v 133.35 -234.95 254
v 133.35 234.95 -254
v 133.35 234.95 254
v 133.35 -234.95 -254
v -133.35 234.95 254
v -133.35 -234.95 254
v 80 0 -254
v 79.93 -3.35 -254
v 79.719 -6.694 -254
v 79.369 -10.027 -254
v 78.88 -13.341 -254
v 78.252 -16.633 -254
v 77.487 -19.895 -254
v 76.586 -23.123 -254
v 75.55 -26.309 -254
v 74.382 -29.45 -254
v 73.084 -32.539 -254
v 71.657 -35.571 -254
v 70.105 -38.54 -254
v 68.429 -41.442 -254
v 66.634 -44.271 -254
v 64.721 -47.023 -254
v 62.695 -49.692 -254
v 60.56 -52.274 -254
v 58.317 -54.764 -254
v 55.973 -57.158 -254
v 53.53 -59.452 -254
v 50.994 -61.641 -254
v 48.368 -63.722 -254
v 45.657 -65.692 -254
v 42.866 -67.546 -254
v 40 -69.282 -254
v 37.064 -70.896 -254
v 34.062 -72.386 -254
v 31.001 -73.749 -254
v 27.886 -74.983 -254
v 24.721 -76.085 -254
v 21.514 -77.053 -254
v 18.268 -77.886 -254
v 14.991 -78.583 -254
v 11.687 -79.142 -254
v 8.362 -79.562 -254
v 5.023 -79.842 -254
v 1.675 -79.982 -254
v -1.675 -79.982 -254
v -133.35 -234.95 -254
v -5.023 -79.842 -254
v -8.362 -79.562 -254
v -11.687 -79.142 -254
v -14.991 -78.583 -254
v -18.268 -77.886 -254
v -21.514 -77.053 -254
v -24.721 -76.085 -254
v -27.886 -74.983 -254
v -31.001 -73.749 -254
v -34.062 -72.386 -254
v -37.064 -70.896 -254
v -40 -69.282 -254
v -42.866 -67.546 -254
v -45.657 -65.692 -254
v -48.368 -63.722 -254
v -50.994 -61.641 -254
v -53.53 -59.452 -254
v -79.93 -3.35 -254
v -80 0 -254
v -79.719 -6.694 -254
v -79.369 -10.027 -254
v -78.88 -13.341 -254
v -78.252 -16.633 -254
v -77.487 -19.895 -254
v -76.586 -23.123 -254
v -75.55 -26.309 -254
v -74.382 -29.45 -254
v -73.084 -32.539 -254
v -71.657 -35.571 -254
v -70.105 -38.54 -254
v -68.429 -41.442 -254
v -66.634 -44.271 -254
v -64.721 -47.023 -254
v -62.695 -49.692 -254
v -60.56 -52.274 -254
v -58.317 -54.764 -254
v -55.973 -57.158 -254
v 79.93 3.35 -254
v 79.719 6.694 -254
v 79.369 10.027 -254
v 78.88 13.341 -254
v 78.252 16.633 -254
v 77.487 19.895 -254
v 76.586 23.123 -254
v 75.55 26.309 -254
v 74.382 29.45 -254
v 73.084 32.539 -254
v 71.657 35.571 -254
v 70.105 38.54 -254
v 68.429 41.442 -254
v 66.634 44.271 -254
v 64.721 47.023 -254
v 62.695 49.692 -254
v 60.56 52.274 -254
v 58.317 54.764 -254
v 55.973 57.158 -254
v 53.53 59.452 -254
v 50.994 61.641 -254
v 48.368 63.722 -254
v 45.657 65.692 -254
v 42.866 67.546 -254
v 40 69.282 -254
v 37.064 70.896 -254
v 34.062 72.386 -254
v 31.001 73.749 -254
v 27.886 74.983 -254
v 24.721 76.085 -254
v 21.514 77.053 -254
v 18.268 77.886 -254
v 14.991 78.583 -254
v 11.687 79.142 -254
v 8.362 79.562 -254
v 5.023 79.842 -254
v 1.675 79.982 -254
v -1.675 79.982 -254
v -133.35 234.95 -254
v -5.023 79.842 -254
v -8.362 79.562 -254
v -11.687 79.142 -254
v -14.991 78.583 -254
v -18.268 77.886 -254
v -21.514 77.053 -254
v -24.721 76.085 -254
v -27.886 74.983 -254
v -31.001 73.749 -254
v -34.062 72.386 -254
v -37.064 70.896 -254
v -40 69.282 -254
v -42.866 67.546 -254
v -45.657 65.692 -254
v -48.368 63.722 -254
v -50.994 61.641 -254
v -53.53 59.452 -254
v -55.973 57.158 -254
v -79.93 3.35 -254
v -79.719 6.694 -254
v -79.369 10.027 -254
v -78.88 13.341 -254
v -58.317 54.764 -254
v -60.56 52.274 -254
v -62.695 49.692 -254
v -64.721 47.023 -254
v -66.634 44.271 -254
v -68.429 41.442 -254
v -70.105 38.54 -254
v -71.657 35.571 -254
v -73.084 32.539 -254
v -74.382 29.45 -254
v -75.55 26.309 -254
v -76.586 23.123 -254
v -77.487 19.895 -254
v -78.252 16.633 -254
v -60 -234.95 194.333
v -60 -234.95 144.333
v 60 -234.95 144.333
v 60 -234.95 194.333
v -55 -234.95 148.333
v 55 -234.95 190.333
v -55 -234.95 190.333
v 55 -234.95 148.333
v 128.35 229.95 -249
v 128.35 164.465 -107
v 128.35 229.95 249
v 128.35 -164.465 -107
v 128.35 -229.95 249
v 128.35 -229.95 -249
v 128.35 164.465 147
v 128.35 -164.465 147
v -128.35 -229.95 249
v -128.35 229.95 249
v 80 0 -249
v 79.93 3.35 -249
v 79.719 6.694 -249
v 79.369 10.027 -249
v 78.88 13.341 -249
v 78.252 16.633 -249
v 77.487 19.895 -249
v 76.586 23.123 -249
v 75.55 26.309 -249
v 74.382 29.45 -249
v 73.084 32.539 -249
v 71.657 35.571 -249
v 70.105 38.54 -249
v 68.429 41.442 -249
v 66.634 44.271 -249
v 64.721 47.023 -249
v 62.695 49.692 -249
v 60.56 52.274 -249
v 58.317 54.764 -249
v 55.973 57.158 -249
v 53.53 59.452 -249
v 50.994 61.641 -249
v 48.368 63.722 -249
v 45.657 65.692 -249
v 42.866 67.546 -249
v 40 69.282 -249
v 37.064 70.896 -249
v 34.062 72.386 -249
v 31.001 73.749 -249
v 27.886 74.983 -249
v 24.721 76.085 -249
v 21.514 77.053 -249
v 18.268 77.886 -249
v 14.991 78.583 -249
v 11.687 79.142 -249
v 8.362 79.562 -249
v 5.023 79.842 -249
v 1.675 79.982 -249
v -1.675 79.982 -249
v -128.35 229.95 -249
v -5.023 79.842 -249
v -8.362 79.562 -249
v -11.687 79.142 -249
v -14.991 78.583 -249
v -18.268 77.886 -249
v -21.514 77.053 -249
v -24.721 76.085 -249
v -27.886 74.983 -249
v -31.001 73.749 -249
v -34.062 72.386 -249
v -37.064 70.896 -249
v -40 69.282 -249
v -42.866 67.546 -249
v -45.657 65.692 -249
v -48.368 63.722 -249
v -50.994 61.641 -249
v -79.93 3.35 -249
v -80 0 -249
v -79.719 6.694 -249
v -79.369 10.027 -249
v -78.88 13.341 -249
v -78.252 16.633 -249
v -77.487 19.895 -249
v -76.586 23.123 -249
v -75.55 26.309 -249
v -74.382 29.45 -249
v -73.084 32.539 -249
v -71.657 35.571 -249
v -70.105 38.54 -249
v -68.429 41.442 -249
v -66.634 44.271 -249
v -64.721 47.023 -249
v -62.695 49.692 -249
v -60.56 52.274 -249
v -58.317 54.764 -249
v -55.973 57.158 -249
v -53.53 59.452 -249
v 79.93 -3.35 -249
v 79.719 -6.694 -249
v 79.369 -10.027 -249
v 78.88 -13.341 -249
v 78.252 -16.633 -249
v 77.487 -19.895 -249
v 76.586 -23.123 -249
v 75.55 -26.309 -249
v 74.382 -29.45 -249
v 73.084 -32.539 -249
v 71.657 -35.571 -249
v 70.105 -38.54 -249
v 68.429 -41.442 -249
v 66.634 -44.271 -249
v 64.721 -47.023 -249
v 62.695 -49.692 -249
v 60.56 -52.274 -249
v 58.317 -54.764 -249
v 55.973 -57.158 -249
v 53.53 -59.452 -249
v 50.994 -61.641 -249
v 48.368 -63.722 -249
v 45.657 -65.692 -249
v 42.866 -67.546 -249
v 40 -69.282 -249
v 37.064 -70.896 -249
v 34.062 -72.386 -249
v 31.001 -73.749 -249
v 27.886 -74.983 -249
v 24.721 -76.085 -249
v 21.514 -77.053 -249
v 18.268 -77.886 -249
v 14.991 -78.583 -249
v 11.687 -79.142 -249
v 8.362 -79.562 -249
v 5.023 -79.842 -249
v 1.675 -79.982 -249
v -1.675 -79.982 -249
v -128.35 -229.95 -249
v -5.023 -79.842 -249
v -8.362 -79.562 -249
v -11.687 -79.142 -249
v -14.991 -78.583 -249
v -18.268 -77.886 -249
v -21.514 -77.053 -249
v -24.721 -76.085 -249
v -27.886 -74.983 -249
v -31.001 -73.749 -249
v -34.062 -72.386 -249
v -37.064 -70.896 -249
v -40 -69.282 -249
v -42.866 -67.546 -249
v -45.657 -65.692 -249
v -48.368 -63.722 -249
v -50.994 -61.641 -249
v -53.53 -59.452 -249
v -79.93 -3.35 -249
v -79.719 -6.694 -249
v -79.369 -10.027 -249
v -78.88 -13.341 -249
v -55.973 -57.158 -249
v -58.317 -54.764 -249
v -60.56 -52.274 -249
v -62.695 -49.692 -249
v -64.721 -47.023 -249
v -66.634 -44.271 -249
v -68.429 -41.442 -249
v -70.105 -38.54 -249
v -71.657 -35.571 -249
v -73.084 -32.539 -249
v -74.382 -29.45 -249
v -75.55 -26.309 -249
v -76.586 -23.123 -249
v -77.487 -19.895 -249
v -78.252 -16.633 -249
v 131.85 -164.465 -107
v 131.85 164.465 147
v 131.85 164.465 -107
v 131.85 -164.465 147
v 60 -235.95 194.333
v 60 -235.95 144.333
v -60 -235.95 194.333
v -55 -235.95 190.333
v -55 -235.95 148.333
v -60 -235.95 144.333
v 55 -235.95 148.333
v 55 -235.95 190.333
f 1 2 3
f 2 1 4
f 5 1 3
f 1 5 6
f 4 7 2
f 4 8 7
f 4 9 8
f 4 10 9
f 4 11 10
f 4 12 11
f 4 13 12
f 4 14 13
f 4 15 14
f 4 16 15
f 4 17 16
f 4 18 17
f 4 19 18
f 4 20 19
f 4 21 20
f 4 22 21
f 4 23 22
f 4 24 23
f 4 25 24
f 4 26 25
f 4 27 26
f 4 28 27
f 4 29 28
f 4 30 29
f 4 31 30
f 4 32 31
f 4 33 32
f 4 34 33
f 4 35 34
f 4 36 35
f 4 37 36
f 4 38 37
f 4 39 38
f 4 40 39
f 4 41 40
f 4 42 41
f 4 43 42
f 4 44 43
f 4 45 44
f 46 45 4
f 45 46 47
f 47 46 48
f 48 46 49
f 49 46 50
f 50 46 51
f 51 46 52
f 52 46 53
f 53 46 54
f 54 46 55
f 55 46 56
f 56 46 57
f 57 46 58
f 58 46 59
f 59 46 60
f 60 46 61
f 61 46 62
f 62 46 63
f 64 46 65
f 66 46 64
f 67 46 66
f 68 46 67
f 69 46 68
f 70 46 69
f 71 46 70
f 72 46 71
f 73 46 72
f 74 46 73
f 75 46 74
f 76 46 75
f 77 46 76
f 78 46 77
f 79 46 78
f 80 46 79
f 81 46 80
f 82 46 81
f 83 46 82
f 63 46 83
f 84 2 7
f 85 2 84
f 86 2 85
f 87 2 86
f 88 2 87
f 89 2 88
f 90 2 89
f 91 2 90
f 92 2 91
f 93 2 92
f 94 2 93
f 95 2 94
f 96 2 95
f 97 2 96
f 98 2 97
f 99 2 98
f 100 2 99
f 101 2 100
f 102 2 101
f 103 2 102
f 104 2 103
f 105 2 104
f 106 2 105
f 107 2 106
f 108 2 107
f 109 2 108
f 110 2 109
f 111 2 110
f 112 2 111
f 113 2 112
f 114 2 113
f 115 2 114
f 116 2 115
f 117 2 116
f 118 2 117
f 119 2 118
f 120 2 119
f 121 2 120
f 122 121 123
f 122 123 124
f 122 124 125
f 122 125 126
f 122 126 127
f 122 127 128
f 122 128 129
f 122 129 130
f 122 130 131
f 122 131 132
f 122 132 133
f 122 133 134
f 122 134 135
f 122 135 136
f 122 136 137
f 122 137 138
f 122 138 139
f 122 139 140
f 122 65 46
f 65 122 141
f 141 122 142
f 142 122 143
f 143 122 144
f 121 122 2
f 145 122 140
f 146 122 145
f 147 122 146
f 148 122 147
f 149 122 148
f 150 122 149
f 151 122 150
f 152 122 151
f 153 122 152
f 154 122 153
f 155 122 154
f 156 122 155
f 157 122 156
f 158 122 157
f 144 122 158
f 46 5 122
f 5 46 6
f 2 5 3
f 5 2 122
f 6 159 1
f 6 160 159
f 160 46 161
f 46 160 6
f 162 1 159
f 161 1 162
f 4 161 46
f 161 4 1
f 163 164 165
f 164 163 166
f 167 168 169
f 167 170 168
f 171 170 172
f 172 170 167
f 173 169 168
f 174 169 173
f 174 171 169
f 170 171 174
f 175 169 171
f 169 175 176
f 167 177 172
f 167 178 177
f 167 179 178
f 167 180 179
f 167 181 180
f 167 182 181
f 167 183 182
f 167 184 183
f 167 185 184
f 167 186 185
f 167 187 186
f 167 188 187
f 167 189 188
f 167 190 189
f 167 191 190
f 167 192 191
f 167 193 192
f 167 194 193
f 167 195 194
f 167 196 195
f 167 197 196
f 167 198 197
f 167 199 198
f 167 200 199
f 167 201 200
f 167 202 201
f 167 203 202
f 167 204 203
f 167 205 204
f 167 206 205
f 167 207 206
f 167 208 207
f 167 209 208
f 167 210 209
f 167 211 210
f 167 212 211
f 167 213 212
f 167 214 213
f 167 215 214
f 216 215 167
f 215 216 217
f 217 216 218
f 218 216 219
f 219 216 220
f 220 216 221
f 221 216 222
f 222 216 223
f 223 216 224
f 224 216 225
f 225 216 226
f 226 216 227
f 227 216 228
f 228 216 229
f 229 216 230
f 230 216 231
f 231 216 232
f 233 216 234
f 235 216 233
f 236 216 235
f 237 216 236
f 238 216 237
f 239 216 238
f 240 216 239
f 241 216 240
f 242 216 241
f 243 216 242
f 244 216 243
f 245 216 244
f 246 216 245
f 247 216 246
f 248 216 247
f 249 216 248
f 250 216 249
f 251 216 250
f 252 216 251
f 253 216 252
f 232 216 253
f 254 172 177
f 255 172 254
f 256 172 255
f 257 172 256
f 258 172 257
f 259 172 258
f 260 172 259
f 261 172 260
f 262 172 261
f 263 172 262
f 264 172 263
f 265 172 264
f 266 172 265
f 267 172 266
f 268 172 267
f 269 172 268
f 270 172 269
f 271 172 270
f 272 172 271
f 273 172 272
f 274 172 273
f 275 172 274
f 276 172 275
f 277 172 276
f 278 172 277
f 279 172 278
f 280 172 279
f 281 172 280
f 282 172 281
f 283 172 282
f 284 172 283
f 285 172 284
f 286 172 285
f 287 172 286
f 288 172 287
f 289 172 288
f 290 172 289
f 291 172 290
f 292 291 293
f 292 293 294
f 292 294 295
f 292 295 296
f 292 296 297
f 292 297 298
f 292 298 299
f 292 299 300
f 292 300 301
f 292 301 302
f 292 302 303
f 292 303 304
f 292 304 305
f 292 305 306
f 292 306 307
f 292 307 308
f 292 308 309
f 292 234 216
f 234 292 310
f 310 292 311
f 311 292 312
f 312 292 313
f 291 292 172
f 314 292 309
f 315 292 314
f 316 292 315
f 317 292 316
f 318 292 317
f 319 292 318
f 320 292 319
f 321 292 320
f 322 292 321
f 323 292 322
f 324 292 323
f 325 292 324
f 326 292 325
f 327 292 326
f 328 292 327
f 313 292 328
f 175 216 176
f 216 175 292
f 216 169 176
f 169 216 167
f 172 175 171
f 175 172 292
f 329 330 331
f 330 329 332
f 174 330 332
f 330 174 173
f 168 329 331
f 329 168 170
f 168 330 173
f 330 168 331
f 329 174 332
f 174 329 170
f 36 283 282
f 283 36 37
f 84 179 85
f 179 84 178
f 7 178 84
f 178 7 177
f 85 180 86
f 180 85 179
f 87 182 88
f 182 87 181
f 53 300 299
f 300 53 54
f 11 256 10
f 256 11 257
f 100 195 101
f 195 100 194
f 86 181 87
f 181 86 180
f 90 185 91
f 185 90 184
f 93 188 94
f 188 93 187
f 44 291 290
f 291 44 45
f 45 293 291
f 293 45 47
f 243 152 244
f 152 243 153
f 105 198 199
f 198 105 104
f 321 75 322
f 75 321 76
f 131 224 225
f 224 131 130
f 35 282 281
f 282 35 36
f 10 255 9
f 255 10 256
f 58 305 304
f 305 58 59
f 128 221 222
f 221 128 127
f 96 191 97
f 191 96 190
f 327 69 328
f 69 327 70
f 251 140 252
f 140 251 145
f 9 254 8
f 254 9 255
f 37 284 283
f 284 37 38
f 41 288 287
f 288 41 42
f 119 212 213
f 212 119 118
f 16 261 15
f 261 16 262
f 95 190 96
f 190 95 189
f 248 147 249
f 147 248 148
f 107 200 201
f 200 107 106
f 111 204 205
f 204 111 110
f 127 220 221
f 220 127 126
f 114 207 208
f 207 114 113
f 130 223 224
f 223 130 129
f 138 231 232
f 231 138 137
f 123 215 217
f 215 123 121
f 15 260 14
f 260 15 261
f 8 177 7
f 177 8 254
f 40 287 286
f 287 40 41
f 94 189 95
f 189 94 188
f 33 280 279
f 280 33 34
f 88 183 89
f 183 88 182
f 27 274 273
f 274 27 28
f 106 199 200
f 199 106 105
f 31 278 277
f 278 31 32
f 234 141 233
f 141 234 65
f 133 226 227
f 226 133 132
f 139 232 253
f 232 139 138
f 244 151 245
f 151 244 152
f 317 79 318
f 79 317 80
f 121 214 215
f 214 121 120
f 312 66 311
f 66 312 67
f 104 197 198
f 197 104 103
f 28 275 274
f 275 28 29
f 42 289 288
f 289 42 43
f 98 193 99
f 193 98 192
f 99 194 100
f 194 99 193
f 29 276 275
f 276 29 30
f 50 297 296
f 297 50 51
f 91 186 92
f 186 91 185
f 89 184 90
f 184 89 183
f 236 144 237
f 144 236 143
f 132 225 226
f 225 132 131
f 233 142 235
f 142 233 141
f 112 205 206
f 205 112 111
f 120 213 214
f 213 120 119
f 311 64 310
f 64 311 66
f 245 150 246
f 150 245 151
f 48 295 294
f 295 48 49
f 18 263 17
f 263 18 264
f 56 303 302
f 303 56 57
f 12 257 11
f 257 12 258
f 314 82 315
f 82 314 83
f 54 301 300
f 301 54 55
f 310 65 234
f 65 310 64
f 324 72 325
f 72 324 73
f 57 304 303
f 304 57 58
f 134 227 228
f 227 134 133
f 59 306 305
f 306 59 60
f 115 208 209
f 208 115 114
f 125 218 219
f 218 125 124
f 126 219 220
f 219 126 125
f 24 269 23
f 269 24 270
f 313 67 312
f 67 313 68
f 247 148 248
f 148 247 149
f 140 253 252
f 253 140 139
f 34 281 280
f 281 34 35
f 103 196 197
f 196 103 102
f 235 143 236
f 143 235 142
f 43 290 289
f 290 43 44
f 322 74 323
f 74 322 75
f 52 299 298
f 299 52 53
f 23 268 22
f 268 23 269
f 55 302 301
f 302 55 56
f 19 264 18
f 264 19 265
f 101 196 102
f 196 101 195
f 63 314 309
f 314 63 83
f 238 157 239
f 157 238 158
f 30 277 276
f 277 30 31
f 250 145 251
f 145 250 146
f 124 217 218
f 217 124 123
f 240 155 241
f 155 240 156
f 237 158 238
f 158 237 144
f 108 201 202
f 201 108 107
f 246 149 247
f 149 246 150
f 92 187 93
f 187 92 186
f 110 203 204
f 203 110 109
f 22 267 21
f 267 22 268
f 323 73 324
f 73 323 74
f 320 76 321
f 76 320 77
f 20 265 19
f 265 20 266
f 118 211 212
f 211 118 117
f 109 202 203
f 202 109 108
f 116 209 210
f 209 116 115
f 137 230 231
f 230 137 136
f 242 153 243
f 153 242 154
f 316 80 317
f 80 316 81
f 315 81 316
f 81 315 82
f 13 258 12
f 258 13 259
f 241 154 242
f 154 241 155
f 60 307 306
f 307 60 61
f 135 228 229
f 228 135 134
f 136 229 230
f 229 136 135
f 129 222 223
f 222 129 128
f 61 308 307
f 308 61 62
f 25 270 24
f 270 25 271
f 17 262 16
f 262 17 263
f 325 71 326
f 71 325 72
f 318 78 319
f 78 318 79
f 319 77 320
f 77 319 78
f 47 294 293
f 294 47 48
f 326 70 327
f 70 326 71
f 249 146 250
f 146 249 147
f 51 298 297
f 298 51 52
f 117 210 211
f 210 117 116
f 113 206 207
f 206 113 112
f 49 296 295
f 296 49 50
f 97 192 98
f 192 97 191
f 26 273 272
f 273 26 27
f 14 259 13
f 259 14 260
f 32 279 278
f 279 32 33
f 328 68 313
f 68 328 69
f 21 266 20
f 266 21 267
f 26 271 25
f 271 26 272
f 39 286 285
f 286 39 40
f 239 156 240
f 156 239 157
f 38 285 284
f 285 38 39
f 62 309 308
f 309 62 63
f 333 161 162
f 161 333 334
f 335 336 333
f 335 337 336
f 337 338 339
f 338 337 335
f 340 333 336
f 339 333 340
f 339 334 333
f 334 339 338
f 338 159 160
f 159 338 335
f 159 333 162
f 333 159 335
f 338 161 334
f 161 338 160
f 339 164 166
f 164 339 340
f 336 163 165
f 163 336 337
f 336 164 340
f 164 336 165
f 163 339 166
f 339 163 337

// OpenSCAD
// STORMSTOPPER Special Public Release: FOX5 Edition Quantum ATX Chassis
// Integrates: Cryogenic Well Shunts and Laser-Etched Telemetry Viewing Panels
// Configured by Emerald City Techs for the First Nevada Public Quantum Deployment

$fn = 150; // Maximum precision layout rendering

in_to_mm = 25.4;
case_width = 10.5 * in_to_mm;   // Extended Desktop Mid-Tower Width (~266.7 mm)
case_height = 20.0 * in_to_mm;  // Full Tower Profile (~508.0 mm)
case_depth = 18.5 * in_to_mm;   // System Component Depth (~469.9 mm)
wall_thickness = 5;             // Armored structural aluminum dampening shield

module fox5_quantum_chassis() {
    difference() {
        // Main Tower Chassis Enclosure
        cube([case_width, case_depth, case_height], center = true);
        
        // Internal Clean Room Cavity for 16-State Motherboard
        cube([case_width - (2 * wall_thickness), case_depth - (2 * wall_thickness), case_height - (2 * wall_thickness)], center = true);
        
        // FEATURE: Left-Panel Viewing Window for the Custom Bridgelux LED Memory Array
        translate([(case_width / 2) - wall_thickness, 0, 20]) {
            cube([wall_thickness + 2, case_depth * 0.7, case_height * 0.5], center = true);
        }
        
        // FEATURE: Base Well Excavation Cutout for Quantum Core Cryogenic Shielding Unit
        translate([0, 0, -(case_height / 2) + 20]) {
            cylinder(h = 60, d = 160, center = true);
        }
    }
    
    // FEATURE: Laser-Etched Front Plate Branding Matrix (Embossed FOX5 Display Track)
    translate([0, -(case_depth / 2) + 1, (case_height / 3)]) {
        rotate([90, 0, 0]) {
            difference() {
                cube([120, 50, 4], center = true);
                // Negative depth engraving for public brand validation plate
                translate([0, 0, 1]) cube([110, 42, 4], center = true);
            }
        }
    }
}

fox5_quantum_chassis();
